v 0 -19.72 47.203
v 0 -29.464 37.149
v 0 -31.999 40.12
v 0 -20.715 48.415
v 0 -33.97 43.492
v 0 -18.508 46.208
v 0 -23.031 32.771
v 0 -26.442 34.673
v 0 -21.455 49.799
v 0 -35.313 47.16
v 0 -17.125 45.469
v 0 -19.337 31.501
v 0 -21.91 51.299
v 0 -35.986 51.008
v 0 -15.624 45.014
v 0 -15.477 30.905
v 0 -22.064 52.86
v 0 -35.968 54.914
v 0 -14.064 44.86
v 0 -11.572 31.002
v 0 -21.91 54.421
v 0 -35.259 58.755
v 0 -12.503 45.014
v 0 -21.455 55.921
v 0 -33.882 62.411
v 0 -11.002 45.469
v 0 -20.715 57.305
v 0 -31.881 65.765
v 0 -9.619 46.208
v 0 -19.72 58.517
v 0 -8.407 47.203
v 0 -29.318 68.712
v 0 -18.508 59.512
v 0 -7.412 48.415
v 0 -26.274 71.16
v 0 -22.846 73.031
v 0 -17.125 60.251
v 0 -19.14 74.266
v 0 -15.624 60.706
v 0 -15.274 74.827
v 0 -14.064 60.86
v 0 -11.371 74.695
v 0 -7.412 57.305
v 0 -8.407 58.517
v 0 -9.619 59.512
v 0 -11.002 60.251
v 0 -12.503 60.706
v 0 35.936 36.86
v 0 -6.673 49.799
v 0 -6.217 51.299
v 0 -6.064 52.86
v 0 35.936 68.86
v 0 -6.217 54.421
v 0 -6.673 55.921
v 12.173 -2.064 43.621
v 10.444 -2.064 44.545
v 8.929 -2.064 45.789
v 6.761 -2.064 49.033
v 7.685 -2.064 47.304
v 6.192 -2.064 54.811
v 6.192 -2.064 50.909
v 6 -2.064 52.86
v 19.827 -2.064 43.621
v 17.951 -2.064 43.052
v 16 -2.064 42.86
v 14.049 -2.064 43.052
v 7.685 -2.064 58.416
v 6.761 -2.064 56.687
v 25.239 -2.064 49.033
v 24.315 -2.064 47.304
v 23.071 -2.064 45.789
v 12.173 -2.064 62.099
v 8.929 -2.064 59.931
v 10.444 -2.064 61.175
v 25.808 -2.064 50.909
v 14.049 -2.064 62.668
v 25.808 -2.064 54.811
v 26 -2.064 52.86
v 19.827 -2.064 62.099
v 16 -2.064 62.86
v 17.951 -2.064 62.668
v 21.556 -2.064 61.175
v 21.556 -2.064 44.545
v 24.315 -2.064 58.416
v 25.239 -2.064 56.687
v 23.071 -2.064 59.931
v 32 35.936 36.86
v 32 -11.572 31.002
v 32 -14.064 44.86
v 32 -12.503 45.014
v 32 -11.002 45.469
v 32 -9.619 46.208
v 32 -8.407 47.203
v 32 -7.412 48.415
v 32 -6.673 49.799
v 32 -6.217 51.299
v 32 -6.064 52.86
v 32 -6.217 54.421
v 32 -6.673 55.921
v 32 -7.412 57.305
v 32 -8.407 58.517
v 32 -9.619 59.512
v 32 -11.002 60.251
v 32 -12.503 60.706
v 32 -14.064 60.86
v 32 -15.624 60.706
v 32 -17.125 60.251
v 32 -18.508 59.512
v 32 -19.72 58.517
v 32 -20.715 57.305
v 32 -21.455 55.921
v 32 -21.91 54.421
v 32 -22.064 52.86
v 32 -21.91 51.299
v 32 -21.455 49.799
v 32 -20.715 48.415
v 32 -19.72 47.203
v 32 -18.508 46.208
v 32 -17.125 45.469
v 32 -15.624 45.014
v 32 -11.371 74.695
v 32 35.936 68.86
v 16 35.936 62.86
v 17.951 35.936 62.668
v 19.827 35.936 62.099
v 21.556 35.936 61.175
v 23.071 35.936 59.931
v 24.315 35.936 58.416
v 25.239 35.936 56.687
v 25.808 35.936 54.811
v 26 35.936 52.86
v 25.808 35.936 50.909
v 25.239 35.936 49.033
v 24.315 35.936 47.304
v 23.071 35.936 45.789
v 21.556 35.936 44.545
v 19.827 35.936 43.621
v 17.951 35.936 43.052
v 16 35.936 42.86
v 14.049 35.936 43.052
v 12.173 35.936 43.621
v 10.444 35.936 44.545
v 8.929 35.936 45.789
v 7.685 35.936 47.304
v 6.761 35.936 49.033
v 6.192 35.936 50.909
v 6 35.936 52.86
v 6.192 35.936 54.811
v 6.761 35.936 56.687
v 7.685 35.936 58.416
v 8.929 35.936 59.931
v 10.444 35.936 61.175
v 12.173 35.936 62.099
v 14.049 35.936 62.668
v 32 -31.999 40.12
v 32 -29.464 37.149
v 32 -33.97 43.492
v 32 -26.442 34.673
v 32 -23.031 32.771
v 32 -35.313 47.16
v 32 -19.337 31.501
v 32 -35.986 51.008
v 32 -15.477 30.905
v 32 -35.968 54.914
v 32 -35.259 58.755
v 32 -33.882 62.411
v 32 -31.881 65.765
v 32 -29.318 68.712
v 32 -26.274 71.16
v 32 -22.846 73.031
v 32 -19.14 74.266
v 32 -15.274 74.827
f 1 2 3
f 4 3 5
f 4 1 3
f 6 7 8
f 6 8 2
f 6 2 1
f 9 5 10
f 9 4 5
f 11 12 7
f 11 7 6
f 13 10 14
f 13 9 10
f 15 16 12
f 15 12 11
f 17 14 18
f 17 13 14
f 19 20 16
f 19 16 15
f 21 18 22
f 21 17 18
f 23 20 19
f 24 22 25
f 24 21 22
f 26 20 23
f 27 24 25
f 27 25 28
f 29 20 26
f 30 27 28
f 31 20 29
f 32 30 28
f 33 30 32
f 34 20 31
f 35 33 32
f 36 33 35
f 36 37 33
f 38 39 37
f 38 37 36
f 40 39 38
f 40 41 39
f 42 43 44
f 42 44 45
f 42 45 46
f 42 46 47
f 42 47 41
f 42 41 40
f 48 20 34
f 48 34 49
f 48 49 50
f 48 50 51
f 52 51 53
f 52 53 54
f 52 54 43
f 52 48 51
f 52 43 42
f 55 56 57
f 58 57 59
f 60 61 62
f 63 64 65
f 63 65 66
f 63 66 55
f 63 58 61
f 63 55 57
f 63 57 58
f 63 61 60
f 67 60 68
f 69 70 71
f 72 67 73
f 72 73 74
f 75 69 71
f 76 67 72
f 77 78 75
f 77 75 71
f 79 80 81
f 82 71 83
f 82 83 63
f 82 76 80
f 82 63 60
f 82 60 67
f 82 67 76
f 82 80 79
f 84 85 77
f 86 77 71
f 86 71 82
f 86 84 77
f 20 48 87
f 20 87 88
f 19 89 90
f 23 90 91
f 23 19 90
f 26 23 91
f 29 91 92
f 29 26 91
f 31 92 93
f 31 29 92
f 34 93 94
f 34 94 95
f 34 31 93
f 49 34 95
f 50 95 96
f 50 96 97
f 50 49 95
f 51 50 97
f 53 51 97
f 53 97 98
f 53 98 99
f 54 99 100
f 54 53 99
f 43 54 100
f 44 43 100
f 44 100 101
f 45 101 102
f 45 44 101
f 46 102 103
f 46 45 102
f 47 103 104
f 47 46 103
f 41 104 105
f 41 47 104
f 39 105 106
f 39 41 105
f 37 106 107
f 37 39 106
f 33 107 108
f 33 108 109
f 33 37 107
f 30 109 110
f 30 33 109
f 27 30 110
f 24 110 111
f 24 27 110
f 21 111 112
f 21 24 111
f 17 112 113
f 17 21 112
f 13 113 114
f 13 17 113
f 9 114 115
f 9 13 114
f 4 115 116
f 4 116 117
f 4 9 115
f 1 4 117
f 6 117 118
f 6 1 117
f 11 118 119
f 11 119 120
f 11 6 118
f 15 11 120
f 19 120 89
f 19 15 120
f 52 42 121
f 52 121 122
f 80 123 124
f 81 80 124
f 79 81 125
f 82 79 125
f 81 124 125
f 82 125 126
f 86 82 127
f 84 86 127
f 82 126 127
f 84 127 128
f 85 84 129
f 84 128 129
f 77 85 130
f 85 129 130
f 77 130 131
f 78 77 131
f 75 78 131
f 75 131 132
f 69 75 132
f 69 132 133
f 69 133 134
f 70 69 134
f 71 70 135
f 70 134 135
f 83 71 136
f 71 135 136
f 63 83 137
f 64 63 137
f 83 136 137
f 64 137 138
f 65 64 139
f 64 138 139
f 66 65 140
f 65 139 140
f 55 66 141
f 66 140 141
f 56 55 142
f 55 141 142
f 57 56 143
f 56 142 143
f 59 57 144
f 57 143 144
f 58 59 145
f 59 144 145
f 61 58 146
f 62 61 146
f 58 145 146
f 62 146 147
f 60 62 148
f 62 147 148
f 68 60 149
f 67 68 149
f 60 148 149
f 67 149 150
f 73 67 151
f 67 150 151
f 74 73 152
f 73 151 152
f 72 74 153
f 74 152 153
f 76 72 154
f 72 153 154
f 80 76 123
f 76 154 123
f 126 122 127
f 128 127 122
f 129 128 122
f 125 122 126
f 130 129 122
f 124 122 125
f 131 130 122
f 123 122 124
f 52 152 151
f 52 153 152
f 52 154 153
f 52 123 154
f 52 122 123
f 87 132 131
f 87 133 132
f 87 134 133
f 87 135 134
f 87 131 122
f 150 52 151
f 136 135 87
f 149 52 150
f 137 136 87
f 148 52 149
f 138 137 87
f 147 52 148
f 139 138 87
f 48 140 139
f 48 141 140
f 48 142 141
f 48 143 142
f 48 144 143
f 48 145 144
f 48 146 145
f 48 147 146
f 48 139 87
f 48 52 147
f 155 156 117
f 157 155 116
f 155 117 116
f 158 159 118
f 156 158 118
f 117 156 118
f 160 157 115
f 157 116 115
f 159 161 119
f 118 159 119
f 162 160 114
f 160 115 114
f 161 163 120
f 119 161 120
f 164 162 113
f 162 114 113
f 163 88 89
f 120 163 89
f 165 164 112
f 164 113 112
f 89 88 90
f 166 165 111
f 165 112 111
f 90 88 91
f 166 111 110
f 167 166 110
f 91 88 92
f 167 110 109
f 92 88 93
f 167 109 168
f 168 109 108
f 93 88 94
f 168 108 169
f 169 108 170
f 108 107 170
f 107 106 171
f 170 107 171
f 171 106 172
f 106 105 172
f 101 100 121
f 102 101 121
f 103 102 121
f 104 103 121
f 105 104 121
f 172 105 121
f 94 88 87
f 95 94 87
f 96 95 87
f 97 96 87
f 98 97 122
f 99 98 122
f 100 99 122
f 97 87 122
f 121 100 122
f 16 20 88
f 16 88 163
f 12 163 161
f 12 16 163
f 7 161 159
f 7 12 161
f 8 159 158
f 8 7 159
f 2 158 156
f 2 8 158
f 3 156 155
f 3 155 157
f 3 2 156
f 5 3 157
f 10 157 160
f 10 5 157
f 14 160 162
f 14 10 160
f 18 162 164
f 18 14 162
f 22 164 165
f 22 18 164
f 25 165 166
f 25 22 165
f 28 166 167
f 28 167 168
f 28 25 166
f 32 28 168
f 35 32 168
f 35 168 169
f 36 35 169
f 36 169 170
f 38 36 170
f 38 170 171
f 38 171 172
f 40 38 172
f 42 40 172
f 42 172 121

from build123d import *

# Parameters (mm, degrees)
IZIM1_R                     = 8
Y_KSEKLIK_EKSTR_ZYON1_DEPTH = 32
IZIM2_R                     = 10
KES_EKSTR_ZYON1_DEPTH       = 38


with BuildPart() as part:
    # Çizim1 → Yükseklik-Ekstrüzyon1 (new body)
    with BuildSketch(Plane(origin=(0, 0, 0), x_dir=(0, 0, -1), z_dir=(1, 0, 0))):
        with BuildLine():
            Line((-74.694543473, -11.370690029), (-68.859982056, 35.936369625))
            Line((-68.859982056, 35.936369625), (-36.859982056, 35.936369625))
            Line((-36.859982056, 35.936369625), (-31.001531459, -11.572016946))
            ThreePointArc((-31.001531459, -11.572016946), (-52.961351702, -36.063396833), (-74.694543473, -11.370690029))
        make_face()
        with Locations((-52.859982056, -14.063630375)):
            Circle(IZIM1_R, mode=Mode.SUBTRACT)
    extrude(amount=Y_KSEKLIK_EKSTR_ZYON1_DEPTH)

    # Çizim2 → Kes-Ekstrüzyon1 (cut)
    with BuildSketch(Plane(origin=(0, 35.936369625, 0), x_dir=(1, 0, 0), z_dir=(0, 1, 0))):
        with Locations(Location((16, -52.859982056, 0), (0, 0, 270))):
            Circle(IZIM2_R)
    extrude(amount=-KES_EKSTR_ZYON1_DEPTH, mode=Mode.SUBTRACT)


solid = part.part
